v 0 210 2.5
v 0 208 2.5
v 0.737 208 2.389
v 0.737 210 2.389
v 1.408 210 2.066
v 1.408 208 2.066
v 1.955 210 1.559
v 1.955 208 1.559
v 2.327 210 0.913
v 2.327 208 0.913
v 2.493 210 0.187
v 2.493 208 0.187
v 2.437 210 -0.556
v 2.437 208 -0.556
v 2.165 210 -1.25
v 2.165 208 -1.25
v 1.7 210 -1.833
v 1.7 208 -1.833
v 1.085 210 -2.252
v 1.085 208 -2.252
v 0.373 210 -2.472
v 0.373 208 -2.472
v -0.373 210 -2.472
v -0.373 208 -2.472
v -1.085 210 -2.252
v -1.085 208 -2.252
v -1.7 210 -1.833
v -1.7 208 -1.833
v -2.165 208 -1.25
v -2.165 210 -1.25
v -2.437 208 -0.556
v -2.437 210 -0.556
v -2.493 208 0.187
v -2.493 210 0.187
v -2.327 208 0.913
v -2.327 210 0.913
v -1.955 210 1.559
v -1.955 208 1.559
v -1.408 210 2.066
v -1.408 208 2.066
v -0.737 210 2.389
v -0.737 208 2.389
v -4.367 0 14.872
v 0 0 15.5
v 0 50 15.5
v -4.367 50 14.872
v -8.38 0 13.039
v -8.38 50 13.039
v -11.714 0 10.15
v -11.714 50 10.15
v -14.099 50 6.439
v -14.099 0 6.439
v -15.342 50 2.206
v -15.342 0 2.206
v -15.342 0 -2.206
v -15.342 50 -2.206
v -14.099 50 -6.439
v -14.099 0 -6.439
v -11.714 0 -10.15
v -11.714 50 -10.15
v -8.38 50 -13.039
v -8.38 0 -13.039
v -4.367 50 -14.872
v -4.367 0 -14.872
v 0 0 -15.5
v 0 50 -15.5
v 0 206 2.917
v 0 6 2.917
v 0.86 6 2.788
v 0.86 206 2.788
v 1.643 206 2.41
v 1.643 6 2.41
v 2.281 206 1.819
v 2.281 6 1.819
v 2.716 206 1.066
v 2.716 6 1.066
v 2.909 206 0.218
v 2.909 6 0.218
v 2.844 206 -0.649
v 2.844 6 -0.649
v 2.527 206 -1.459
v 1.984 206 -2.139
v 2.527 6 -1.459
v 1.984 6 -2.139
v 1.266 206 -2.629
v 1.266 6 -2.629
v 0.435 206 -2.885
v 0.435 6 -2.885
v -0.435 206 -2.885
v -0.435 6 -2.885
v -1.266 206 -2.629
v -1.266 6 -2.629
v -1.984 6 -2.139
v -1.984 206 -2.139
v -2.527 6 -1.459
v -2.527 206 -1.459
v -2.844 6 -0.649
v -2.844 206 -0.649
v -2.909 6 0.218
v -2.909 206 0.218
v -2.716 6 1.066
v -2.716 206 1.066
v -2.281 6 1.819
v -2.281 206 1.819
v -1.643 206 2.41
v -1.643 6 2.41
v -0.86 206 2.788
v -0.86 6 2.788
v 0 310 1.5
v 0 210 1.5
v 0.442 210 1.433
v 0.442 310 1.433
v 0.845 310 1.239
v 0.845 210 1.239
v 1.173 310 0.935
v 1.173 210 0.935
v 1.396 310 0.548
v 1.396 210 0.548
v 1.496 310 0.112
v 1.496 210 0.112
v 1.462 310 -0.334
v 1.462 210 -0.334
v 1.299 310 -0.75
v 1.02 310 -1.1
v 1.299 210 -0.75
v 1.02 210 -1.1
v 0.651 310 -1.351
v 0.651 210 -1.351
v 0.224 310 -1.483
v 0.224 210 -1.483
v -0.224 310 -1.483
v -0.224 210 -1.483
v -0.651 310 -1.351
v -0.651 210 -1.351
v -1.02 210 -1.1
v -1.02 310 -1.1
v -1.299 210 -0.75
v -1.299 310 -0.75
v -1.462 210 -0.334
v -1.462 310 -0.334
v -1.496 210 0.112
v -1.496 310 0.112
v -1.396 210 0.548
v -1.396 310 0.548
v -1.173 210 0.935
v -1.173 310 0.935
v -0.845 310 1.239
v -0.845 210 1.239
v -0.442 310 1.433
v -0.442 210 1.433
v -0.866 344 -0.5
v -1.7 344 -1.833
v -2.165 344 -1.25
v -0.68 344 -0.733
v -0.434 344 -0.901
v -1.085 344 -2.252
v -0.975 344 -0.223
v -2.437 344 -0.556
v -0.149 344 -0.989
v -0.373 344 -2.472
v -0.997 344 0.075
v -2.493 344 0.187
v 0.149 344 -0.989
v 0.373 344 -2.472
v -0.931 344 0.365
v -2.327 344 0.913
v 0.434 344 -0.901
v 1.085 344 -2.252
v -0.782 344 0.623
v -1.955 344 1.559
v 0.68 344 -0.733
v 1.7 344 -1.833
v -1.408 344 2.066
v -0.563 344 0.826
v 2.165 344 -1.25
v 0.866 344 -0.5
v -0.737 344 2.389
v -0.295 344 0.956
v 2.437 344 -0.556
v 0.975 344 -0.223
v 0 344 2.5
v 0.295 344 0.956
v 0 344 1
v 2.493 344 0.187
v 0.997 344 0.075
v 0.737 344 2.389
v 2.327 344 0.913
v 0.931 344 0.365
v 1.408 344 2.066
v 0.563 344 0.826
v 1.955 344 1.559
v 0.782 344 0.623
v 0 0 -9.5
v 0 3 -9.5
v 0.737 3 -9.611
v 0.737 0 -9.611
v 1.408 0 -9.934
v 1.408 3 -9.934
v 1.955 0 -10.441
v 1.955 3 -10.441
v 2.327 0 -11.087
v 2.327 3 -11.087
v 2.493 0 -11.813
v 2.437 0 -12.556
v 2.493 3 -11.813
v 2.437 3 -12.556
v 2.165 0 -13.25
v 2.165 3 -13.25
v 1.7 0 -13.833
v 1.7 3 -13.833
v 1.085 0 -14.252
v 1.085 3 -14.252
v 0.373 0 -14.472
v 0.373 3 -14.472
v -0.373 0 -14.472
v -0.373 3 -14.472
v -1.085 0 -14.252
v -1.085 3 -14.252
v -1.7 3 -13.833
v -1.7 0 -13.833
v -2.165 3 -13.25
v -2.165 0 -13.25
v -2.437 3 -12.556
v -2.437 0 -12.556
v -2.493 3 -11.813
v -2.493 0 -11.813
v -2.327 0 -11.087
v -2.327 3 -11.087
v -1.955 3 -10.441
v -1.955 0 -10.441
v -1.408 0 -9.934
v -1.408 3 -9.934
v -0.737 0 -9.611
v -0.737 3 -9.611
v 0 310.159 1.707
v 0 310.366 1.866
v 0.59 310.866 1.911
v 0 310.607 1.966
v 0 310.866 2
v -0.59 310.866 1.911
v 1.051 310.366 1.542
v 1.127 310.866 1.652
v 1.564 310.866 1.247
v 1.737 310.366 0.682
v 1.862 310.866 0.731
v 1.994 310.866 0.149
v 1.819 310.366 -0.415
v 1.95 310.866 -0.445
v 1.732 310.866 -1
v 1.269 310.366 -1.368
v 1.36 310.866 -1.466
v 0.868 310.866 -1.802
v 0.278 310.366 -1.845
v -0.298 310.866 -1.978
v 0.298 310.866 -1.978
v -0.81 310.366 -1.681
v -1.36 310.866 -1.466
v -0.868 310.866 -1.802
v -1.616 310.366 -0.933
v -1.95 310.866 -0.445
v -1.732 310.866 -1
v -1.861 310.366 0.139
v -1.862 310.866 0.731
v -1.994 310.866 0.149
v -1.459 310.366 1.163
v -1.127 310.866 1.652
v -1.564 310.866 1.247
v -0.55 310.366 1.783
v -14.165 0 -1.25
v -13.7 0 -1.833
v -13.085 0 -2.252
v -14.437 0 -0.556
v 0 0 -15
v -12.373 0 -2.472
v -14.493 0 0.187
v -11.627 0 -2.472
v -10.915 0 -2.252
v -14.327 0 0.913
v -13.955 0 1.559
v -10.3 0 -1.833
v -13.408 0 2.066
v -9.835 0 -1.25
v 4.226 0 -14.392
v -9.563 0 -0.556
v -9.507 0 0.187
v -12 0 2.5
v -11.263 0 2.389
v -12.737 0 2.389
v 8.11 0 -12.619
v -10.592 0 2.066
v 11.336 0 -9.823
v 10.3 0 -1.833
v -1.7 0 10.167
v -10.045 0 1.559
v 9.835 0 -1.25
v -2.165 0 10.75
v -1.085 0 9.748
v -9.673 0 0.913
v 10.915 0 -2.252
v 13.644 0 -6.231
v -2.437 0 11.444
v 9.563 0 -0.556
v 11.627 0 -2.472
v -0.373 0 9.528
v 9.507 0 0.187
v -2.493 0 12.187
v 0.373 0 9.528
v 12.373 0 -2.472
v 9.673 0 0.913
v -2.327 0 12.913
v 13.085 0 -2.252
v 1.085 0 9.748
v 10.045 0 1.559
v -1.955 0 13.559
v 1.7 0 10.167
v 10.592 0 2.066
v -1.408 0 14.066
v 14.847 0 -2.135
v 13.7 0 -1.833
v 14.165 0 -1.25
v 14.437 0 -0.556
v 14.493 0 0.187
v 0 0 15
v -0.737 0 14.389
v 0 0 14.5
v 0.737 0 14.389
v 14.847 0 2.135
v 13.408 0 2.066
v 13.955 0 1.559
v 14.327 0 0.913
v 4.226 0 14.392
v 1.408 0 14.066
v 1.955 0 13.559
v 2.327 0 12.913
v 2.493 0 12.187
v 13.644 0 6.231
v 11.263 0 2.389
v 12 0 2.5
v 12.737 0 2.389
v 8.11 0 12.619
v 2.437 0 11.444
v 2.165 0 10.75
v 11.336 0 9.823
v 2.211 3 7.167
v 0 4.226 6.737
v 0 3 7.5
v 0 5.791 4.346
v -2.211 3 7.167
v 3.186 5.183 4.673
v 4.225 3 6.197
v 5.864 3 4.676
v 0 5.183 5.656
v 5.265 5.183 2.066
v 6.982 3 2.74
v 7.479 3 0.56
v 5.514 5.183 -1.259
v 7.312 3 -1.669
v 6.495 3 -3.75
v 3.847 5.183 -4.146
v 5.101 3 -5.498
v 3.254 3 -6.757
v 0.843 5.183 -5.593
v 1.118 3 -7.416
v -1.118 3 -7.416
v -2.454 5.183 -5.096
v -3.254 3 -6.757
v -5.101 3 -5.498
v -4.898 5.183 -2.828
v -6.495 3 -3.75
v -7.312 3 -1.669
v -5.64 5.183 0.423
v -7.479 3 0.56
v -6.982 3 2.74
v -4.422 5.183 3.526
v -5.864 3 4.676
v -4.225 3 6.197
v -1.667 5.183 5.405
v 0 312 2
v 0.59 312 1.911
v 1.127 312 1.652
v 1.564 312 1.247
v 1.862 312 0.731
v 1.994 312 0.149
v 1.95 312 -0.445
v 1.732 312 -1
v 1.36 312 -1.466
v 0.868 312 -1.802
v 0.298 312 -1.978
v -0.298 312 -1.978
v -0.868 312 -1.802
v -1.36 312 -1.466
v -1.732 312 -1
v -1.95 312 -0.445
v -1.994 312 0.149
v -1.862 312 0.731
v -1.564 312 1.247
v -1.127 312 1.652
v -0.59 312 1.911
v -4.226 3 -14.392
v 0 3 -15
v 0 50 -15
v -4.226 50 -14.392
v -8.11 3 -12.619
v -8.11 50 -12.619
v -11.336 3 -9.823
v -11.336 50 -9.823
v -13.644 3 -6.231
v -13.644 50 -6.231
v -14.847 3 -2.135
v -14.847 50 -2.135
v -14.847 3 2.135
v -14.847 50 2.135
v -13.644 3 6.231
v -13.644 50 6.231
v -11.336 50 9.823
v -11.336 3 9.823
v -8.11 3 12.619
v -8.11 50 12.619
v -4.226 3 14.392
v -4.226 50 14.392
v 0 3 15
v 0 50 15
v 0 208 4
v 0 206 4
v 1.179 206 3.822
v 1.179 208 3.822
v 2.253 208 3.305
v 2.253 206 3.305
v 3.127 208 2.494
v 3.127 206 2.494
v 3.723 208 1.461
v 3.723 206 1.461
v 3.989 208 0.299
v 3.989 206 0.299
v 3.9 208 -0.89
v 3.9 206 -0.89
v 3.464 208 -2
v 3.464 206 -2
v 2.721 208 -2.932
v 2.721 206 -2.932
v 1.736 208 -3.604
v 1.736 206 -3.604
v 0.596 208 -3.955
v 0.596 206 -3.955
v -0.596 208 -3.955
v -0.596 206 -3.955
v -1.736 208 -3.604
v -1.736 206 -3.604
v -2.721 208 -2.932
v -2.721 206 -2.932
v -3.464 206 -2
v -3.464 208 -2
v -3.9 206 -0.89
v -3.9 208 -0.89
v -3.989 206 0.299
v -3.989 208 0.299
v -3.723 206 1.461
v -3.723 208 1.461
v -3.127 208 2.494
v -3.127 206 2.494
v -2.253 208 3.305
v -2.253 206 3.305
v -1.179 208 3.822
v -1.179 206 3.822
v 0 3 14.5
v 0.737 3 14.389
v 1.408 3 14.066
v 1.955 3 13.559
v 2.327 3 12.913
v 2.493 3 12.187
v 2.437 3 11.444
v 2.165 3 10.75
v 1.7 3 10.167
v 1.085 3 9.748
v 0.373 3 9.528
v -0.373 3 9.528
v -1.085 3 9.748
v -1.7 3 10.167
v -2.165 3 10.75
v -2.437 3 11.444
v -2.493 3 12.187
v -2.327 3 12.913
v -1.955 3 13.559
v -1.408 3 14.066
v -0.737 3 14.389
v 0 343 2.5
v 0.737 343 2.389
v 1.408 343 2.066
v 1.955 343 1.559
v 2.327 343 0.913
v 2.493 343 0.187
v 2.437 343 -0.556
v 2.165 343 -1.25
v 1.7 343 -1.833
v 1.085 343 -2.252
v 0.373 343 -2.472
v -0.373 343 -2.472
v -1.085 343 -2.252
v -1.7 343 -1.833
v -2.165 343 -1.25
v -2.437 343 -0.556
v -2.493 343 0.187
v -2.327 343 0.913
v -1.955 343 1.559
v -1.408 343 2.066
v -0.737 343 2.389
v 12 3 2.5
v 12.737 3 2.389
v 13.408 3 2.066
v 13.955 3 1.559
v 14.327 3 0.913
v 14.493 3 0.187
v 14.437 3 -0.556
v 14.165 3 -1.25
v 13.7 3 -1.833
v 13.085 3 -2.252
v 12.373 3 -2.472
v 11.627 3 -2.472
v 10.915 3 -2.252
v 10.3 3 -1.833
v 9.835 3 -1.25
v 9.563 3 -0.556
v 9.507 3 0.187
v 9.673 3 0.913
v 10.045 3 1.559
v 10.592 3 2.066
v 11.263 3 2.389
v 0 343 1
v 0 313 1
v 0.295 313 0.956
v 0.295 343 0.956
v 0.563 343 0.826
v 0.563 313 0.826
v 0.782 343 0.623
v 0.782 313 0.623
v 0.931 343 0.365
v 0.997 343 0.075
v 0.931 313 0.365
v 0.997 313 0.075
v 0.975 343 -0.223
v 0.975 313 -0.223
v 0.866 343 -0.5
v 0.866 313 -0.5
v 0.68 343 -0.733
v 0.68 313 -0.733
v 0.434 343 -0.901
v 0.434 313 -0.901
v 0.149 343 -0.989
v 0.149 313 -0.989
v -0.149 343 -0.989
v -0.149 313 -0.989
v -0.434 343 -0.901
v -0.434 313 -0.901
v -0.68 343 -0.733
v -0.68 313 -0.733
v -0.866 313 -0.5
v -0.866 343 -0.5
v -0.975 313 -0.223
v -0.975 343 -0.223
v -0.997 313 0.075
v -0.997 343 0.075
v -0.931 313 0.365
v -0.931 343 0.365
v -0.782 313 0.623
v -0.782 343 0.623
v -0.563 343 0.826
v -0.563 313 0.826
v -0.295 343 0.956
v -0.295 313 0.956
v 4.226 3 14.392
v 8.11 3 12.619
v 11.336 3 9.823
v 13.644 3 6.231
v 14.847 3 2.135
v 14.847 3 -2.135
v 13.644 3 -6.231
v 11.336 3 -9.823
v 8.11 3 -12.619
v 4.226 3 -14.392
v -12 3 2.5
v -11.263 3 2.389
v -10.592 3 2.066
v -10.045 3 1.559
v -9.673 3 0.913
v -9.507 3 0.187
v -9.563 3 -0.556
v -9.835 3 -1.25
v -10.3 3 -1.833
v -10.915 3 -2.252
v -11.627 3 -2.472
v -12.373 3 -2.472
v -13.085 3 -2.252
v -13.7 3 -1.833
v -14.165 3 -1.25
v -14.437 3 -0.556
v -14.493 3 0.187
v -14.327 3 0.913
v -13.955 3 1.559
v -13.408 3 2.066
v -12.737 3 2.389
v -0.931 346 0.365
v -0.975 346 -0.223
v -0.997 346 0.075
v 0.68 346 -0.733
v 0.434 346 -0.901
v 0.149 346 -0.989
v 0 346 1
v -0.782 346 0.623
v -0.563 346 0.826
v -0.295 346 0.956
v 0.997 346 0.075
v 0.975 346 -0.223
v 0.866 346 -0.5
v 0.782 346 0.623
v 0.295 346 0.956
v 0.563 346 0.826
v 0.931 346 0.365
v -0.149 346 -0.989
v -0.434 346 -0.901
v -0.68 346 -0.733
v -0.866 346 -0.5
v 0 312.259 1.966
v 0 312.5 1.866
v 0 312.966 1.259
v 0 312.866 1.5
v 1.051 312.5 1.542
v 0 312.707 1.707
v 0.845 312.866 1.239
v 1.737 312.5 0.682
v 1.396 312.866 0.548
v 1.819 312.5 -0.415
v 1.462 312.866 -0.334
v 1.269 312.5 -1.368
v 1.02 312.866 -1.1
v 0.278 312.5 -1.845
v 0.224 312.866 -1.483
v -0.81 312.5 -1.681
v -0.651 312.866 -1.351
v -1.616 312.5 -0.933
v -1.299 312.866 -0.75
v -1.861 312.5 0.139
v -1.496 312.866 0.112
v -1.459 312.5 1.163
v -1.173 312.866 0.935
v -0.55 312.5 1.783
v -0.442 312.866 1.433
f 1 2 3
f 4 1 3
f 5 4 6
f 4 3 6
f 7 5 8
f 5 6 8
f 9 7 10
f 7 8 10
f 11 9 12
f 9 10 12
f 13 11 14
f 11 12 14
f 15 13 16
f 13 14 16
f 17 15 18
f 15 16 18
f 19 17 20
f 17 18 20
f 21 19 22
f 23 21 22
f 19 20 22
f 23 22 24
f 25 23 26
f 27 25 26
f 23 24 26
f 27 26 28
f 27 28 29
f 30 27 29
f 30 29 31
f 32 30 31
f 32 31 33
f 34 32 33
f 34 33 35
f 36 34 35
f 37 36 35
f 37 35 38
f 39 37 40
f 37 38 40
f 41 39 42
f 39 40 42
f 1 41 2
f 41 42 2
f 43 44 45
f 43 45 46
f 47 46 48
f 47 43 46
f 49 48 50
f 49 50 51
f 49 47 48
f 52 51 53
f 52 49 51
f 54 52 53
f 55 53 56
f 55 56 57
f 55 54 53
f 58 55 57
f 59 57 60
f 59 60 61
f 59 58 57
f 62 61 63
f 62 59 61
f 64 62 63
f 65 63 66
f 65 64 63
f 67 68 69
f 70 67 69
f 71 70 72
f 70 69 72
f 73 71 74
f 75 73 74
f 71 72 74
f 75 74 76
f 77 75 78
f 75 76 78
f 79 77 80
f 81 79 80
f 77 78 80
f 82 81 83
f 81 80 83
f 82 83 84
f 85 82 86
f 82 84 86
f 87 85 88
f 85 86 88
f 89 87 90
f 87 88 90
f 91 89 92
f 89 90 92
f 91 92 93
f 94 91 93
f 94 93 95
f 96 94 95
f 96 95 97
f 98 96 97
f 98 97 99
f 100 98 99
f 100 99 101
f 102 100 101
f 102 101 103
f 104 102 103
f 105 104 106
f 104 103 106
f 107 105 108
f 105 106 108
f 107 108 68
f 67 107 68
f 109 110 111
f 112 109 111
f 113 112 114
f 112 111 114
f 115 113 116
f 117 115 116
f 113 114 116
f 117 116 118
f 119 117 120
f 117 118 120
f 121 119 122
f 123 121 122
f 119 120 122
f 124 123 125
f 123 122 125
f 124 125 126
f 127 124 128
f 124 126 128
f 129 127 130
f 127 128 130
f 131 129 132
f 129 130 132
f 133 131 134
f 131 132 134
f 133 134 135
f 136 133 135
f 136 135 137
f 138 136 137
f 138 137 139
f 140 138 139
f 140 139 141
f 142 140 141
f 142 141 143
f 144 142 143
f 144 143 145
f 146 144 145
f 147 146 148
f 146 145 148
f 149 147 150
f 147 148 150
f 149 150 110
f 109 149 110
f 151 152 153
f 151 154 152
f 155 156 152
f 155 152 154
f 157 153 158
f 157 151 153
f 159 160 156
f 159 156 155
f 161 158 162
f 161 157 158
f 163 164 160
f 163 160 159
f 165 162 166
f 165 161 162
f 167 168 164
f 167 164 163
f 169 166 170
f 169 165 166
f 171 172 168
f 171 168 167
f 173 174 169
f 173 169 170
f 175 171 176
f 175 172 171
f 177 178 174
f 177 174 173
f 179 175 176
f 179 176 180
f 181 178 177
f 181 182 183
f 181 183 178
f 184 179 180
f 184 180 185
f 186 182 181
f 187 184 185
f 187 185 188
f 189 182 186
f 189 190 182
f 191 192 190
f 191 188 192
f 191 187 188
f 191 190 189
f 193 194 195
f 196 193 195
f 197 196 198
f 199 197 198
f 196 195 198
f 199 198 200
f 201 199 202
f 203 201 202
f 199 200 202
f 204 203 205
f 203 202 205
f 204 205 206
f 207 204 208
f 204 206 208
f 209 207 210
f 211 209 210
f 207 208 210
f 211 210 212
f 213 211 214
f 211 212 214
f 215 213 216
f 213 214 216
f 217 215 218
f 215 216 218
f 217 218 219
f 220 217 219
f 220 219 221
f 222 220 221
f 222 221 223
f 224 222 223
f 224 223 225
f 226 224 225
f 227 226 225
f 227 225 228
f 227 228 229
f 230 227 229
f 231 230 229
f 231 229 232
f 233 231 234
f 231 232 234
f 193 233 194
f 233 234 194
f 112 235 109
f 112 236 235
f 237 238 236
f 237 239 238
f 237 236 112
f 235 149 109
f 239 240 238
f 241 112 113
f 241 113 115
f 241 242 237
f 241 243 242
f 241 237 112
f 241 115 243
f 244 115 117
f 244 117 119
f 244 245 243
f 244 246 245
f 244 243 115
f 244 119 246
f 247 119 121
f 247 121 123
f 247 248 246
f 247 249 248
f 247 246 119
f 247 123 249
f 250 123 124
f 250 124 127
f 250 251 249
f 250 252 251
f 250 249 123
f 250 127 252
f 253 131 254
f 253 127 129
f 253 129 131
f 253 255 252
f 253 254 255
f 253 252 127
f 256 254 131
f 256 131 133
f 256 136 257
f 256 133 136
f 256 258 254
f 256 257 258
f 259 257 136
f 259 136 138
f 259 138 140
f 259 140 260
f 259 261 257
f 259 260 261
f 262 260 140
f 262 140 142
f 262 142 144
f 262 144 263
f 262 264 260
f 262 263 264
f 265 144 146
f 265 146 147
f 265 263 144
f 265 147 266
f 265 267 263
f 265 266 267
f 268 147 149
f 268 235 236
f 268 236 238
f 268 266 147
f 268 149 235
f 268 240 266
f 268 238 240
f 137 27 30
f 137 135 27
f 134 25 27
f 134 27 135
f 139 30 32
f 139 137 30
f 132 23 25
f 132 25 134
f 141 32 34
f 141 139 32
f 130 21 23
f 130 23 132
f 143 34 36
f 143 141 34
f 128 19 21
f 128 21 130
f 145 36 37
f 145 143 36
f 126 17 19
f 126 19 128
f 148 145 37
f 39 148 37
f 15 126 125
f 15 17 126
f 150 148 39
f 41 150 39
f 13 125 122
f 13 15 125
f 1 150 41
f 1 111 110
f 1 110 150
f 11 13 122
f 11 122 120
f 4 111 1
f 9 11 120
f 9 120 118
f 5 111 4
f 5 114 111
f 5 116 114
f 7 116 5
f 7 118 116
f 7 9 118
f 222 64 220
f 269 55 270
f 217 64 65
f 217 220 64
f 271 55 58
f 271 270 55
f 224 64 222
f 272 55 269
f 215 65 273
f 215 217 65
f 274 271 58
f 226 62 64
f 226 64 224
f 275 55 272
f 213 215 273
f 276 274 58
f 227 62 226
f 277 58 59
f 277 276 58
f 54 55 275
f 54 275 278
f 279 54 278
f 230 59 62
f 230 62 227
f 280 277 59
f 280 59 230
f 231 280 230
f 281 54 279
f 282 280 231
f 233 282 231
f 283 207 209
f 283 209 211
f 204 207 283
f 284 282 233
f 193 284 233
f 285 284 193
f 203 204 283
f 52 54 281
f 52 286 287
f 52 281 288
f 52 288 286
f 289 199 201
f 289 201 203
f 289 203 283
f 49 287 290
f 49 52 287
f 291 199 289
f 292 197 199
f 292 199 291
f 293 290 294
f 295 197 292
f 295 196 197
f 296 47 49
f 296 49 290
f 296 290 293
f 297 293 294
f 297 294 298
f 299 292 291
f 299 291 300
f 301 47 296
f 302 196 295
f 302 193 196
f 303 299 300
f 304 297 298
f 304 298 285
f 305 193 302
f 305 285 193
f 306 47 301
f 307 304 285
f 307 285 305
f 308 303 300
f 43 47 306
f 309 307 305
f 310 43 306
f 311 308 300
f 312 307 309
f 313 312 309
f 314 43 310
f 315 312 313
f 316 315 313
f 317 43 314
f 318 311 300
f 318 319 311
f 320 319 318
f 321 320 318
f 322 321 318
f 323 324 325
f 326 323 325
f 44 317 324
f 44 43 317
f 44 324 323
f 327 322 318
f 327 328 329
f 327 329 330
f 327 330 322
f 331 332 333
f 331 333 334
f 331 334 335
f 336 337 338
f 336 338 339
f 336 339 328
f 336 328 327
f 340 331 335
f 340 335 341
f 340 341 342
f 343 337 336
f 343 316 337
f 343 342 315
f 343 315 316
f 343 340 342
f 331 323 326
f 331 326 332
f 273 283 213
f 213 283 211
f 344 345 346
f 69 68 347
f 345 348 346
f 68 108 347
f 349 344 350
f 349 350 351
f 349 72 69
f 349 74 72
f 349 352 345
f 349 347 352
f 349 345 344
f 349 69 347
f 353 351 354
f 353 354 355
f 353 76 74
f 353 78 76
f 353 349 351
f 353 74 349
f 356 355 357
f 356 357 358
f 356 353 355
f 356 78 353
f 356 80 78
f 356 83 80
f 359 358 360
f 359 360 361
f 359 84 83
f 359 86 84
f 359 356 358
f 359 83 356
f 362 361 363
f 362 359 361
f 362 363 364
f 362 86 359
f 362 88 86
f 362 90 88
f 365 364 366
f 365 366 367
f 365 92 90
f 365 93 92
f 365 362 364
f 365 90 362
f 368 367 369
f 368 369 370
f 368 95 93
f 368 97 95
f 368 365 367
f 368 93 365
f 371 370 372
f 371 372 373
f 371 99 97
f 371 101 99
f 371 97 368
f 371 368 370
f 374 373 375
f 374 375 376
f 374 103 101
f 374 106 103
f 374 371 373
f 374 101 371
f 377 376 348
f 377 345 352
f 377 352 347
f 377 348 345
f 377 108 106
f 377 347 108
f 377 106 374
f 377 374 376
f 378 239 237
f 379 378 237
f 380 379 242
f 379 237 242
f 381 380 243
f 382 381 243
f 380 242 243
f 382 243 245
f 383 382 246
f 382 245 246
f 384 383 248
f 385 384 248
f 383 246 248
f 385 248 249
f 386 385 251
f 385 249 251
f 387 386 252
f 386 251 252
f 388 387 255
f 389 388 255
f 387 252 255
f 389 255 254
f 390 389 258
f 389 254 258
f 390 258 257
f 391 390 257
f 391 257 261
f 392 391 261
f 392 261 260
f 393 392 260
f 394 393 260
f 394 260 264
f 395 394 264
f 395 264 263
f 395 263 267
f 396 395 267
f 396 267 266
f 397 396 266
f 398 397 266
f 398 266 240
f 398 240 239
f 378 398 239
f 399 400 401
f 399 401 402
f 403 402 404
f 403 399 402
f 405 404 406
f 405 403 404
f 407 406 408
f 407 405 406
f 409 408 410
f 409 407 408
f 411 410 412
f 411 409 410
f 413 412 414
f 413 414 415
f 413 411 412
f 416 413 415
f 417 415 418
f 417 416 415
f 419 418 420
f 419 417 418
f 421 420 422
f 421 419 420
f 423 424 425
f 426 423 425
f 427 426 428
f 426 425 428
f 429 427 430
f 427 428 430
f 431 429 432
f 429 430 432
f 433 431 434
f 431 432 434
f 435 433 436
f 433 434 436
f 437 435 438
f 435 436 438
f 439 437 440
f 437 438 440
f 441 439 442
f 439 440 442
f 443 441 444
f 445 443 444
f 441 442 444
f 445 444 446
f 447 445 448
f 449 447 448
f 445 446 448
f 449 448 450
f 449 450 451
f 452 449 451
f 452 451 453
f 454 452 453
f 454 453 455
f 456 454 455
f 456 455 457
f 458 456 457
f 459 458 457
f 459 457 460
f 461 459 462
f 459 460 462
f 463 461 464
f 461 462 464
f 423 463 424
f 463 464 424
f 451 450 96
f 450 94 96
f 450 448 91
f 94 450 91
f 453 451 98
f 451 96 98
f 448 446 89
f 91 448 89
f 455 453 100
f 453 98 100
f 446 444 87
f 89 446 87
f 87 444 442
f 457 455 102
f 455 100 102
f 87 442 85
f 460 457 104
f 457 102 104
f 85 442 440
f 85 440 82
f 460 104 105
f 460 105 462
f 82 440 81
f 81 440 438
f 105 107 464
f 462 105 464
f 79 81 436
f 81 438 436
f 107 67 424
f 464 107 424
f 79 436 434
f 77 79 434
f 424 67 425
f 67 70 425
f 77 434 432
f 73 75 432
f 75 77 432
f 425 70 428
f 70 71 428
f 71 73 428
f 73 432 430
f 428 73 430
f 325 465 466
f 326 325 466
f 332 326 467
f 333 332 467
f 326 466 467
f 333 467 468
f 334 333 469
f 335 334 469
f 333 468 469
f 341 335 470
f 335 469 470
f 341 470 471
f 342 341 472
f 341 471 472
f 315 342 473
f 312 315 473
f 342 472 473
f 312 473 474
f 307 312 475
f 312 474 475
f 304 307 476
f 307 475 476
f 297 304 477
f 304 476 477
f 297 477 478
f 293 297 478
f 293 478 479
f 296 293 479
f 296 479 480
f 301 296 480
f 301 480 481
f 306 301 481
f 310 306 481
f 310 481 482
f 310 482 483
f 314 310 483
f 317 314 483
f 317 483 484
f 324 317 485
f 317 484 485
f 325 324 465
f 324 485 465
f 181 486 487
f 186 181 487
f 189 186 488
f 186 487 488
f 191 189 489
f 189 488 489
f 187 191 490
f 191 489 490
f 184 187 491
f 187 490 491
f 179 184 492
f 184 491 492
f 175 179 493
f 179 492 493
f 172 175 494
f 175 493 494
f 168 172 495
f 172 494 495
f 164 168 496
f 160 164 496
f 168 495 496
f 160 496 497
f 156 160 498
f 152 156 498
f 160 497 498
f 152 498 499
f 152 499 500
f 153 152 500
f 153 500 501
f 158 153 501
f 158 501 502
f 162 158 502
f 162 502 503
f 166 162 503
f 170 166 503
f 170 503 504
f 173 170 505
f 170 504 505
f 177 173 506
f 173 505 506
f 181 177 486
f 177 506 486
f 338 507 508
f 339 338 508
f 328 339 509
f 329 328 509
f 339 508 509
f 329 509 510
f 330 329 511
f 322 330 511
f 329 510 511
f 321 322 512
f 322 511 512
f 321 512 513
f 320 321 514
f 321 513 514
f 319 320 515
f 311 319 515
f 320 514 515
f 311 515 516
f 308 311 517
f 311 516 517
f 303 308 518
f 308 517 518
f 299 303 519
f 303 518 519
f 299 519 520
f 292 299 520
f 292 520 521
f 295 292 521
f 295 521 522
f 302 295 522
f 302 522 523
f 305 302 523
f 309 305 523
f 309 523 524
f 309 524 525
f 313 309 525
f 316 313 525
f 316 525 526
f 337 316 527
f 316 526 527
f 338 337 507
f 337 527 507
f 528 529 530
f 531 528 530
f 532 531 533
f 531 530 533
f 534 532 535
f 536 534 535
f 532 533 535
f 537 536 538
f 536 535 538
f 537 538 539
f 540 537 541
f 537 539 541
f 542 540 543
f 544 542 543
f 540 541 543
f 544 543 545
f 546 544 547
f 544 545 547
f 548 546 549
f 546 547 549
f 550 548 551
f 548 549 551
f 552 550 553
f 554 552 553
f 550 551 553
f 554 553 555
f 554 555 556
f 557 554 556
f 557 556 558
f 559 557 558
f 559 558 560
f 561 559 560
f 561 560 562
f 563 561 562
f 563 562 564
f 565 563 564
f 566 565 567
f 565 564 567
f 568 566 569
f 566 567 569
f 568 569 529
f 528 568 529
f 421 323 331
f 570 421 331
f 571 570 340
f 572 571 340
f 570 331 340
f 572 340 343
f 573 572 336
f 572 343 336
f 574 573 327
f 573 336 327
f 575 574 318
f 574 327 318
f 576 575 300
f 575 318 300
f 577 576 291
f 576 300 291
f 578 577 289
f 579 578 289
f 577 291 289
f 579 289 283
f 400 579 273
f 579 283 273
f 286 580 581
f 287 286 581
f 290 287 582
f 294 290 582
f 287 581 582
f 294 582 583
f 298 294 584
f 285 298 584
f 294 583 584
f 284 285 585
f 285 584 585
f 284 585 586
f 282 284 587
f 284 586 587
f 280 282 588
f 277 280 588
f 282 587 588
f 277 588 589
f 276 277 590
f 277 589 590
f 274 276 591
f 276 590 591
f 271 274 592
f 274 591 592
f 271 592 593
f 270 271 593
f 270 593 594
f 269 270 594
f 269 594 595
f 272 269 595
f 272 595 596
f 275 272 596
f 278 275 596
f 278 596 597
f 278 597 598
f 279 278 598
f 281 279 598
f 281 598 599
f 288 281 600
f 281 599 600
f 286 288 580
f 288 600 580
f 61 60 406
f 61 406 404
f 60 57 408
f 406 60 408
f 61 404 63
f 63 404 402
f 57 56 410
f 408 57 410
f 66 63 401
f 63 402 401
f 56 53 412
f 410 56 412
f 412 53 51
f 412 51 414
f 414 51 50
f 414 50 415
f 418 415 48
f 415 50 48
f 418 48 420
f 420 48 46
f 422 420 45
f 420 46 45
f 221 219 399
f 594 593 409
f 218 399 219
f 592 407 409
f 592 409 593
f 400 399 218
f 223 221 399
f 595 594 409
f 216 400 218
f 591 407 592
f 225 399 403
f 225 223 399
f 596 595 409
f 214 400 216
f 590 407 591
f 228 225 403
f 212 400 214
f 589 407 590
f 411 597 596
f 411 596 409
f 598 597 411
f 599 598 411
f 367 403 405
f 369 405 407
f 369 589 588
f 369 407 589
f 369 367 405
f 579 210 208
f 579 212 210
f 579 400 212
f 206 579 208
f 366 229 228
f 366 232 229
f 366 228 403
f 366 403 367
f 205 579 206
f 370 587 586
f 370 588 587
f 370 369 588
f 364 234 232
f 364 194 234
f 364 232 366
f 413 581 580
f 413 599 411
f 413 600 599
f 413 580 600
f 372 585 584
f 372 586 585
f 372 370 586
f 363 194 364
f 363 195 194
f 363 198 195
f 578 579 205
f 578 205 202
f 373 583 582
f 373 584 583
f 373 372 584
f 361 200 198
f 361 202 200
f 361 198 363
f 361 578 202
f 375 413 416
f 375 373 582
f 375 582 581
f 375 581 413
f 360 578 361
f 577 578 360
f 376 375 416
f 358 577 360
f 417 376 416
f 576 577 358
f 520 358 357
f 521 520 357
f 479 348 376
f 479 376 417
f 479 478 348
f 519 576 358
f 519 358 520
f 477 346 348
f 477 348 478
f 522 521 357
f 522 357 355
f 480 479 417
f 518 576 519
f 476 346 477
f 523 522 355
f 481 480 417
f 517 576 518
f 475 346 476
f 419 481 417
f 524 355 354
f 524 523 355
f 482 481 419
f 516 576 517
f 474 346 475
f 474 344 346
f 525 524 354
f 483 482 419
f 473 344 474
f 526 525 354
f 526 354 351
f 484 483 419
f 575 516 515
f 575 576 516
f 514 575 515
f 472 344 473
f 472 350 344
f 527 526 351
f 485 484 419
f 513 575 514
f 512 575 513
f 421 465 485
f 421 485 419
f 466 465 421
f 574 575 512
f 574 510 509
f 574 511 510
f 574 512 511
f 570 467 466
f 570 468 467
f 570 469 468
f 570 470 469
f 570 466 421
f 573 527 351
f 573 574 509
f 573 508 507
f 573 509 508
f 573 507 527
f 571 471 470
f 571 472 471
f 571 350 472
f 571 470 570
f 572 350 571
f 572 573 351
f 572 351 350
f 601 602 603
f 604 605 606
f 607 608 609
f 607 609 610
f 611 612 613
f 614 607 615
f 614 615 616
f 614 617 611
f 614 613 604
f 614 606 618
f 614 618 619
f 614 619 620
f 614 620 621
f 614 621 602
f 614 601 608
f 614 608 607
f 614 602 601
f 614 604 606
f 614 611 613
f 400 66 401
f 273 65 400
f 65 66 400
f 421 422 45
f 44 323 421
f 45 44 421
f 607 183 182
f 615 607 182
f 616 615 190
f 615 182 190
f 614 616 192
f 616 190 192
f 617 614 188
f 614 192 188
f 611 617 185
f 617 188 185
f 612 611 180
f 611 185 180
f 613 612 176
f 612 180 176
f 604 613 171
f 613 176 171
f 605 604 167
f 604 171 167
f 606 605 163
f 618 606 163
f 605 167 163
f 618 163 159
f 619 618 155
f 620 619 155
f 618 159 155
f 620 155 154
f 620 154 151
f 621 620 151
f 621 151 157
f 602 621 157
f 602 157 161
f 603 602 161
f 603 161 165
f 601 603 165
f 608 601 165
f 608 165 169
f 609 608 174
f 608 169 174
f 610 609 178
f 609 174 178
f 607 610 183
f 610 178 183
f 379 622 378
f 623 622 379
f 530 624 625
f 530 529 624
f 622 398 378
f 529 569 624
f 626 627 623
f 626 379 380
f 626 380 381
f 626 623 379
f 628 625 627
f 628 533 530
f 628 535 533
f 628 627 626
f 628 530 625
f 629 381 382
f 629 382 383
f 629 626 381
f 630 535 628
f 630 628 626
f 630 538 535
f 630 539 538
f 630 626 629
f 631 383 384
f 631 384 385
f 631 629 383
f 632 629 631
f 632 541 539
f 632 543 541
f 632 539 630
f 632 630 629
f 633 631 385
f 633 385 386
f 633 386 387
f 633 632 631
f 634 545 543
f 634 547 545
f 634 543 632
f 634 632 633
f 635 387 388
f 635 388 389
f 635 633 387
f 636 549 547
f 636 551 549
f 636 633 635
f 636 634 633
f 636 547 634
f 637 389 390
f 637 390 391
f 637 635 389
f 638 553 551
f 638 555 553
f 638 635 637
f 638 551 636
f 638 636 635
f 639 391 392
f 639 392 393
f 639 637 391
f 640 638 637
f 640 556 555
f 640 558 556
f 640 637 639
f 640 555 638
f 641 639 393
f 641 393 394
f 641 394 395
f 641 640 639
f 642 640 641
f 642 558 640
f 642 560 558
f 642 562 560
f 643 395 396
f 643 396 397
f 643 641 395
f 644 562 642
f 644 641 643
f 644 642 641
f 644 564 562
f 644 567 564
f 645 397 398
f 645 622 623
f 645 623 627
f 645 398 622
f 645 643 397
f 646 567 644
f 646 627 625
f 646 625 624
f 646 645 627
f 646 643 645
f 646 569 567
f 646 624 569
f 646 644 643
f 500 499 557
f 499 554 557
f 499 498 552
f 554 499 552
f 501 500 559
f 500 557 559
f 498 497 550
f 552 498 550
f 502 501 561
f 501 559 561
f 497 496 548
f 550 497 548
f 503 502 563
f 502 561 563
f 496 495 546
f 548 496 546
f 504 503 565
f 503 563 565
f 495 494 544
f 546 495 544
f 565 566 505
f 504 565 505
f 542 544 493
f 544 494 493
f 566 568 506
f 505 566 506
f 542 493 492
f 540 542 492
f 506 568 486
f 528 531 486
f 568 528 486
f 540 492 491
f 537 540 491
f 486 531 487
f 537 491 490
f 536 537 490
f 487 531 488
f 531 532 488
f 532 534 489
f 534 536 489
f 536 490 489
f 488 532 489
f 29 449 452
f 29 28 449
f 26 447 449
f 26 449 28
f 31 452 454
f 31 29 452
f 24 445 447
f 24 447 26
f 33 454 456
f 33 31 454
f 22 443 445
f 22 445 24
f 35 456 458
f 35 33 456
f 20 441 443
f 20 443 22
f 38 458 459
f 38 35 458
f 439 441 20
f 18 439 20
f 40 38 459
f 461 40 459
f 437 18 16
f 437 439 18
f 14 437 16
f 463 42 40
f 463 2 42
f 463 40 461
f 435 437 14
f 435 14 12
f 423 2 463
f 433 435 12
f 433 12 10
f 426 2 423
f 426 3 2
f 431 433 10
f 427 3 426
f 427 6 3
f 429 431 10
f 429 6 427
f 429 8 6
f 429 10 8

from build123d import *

# Parameters (mm, degrees)
SKETCH1_R            = 15
BOSS_EXTRUDE1_DEPTH  = 3
SKETCH2_R            = 2.5
CUT_EXTRUDE1_DEPTH   = 3
SKETCH3_R            = 7.5
BOSS_EXTRUDE3_DEPTH  = 3
FILLET1_R            = 5
SKETCH4_R            = 2.917424305
BOSS_EXTRUDE4_DEPTH  = 200
SKETCH5_R            = 4
BOSS_EXTRUDE5_DEPTH  = 2
SKETCH6_R            = 2.5
BOSS_EXTRUDE6_DEPTH  = 2
SKETCH7_R            = 1.5
BOSS_EXTRUDE7_DEPTH  = 100
SKETCH8_R            = 2
BOSS_EXTRUDE9_DEPTH  = 3
FILLET4_R            = 1
SKETCH9_R            = 1
BOSS_EXTRUDE10_DEPTH = 30
SKETCH10_R           = 2.5
BOSS_EXTRUDE11_DEPTH = 1
SKETCH11_R           = 1
BOSS_EXTRUDE12_DEPTH = 2
BOSS_EXTRUDE13_DEPTH = 50


with BuildPart() as part:
    # Sketch1 → Boss-Extrude1 (new body)
    with BuildSketch(Plane(origin=(0, 0, 0), x_dir=(1, 0, 0), z_dir=(0, 1, 0))):
        with Locations(Location((0, 0, 0), (0, 0, 270))):
            Circle(SKETCH1_R)
    extrude(amount=BOSS_EXTRUDE1_DEPTH)

    # Sketch2 → Cut-Extrude1 (cut)
    with BuildSketch(Plane(origin=(0, 3, 0), x_dir=(1, 0, 0), z_dir=(0, 1, 0))):
        with Locations(Location((0, 12, 0), (0, 0, 270))):
            Circle(SKETCH2_R)
        with Locations(Location((12, 0, 0), (0, 0, 270))):
            Circle(SKETCH2_R)
        with Locations(Location((0, -12, 0), (0, 0, 270))):
            Circle(SKETCH2_R)
        with Locations(Location((-12, 0, 0), (0, 0, 270))):
            Circle(SKETCH2_R)
    extrude(amount=-CUT_EXTRUDE1_DEPTH, mode=Mode.SUBTRACT)

    # Sketch3 → Boss-Extrude3 (add)
    with BuildSketch(Plane(origin=(0, 3, 0), x_dir=(1, 0, 0), z_dir=(0, 1, 0))):
        with Locations(Location((0, 0, 0), (0, 0, 270))):
            Circle(SKETCH3_R)
    extrude(amount=BOSS_EXTRUDE3_DEPTH)

    # Fillet1
    # the kernel refuses this fillet: 5 mm, written as the material it takes off along each edge
    with BuildSketch(Plane(origin=(0, 6, 0), x_dir=(0, 0, 1), z_dir=(-1, 0, 0))) as fillet1_piece_1:
        with BuildLine():
            CenterArc((2.917424305, -5), FILLET1_R, 23.578178478, 66.421821522)
            Line((2.917424305, 0), (2.917424305, 0.1))
            Line((2.917424305, 0.1), (7.5, 0.1))
            Line((7.5, 0.1), (7.6, 0))
            ThreePointArc((7.6, 0), (7.6, -1.5), (7.591651514, -2.96))
            Line((7.591651514, -2.96), (7.5, -3))
        make_face()
    revolve(axis=Axis((0, 6, 0), (0, 1, 0)), mode=Mode.SUBTRACT)

    # Sketch4 → Boss-Extrude4 (add)
    with BuildSketch(Plane(origin=(0, 6, 0), x_dir=(1, 0, 0), z_dir=(0, 1, 0))):
        with Locations(Location((0, 0, 0), (0, 0, 270))):
            Circle(SKETCH4_R)
    extrude(amount=BOSS_EXTRUDE4_DEPTH)

    # Sketch5 → Boss-Extrude5 (add)
    with BuildSketch(Plane(origin=(0, 206, 0), x_dir=(1, 0, 0), z_dir=(0, 1, 0))):
        with Locations(Location((0, 0, 0), (0, 0, 270))):
            Circle(SKETCH5_R)
    extrude(amount=BOSS_EXTRUDE5_DEPTH)

    # Sketch6 → Boss-Extrude6 (add)
    with BuildSketch(Plane(origin=(0, 208, 0), x_dir=(1, 0, 0), z_dir=(0, 1, 0))):
        with Locations(Location((0, 0, 0), (0, 0, 270))):
            Circle(SKETCH6_R)
    extrude(amount=BOSS_EXTRUDE6_DEPTH)

    # Sketch7 → Boss-Extrude7 (add)
    with BuildSketch(Plane(origin=(0, 210, 0), x_dir=(1, 0, 0), z_dir=(0, 1, 0))):
        with Locations(Location((0, 0, 0), (0, 0, 270))):
            Circle(SKETCH7_R)
    extrude(amount=BOSS_EXTRUDE7_DEPTH)

    # Sketch8 → Boss-Extrude9 (add)
    with BuildSketch(Plane(origin=(0, 310, 0), x_dir=(1, 0, 0), z_dir=(0, 1, 0))):
        with Locations(Location((0, 0, 0), (0, 0, 270))):
            Circle(SKETCH8_R)
    extrude(amount=BOSS_EXTRUDE9_DEPTH)

    # Fillet4
    # the kernel refuses this fillet: 1 mm, written as the material it takes off along each edge
    with BuildSketch(Plane(origin=(0, 310, 0), x_dir=(0, 0, 1), z_dir=(-1, 0, 0))) as fillet4_piece_1:
        with BuildLine():
            CenterArc((1, 0.866025404), FILLET4_R, 300, 60)
            Line((1.5, 0), (1.51, -0.017320508))
            ThreePointArc((1.51, -0.017320508), (1.75, -0.02), (2, -0.02))
            Line((2, -0.02), (2.02, 0))
            Line((2.02, 0), (2.02, 0.866025404))
            Line((2.02, 0.866025404), (2, 0.866025404))
        make_face()
    revolve(axis=Axis((0, 310, 0), (0, 1, 0)), mode=Mode.SUBTRACT)
    with BuildSketch(Plane(origin=(0, 313, 0), x_dir=(0, 0, 1), z_dir=(-1, 0, 0))) as fillet4_piece_2:
        with BuildLine():
            CenterArc((2 - FILLET4_R, -FILLET4_R), FILLET4_R, 0, 90)
            Line((2 - FILLET4_R, 0), (2 - FILLET4_R, FILLET4_R * 0.02))
            Line((2 - FILLET4_R, FILLET4_R * 0.02), (2 + FILLET4_R * 0.02, FILLET4_R * 0.02))
            Line((2 + FILLET4_R * 0.02, FILLET4_R * 0.02), (2 + FILLET4_R * 0.02, -FILLET4_R))
            Line((2 + FILLET4_R * 0.02, -FILLET4_R), (2, -FILLET4_R))
        make_face()
    revolve(axis=Axis((0, 313, 0), (0, 1, 0)), mode=Mode.SUBTRACT)

    # Sketch9 → Boss-Extrude10 (add)
    with BuildSketch(Plane(origin=(0, 313, 0), x_dir=(1, 0, 0), z_dir=(0, 1, 0))):
        with Locations(Location((0, 0, 0), (0, 0, 270))):
            Circle(SKETCH9_R)
    extrude(amount=BOSS_EXTRUDE10_DEPTH)

    # Sketch10 → Boss-Extrude11 (add)
    with BuildSketch(Plane(origin=(0, 343, 0), x_dir=(1, 0, 0), z_dir=(0, 1, 0))):
        with Locations(Location((0, 0, 0), (0, 0, 270))):
            Circle(SKETCH10_R)
    extrude(amount=BOSS_EXTRUDE11_DEPTH)

    # Sketch11 → Boss-Extrude12 (add)
    with BuildSketch(Plane(origin=(0, 344, 0), x_dir=(1, 0, 0), z_dir=(0, 1, 0))):
        with Locations(Location((0, 0, 0), (0, 0, 270))):
            Circle(SKETCH11_R)
    extrude(amount=BOSS_EXTRUDE12_DEPTH)

    # Sketch12 → Boss-Extrude13 (add)
    with BuildSketch(Plane.XZ):
        with BuildLine():
            Line((0, 15), (0, 15.5))
            ThreePointArc((0, 15.5), (-15.5, 0), (0, -15.5))
            Line((0, -15.5), (0, -15))
            ThreePointArc((0, -15), (-15, 0), (0, 15))
        make_face()
    extrude(amount=-BOSS_EXTRUDE13_DEPTH)


solid = part.part
